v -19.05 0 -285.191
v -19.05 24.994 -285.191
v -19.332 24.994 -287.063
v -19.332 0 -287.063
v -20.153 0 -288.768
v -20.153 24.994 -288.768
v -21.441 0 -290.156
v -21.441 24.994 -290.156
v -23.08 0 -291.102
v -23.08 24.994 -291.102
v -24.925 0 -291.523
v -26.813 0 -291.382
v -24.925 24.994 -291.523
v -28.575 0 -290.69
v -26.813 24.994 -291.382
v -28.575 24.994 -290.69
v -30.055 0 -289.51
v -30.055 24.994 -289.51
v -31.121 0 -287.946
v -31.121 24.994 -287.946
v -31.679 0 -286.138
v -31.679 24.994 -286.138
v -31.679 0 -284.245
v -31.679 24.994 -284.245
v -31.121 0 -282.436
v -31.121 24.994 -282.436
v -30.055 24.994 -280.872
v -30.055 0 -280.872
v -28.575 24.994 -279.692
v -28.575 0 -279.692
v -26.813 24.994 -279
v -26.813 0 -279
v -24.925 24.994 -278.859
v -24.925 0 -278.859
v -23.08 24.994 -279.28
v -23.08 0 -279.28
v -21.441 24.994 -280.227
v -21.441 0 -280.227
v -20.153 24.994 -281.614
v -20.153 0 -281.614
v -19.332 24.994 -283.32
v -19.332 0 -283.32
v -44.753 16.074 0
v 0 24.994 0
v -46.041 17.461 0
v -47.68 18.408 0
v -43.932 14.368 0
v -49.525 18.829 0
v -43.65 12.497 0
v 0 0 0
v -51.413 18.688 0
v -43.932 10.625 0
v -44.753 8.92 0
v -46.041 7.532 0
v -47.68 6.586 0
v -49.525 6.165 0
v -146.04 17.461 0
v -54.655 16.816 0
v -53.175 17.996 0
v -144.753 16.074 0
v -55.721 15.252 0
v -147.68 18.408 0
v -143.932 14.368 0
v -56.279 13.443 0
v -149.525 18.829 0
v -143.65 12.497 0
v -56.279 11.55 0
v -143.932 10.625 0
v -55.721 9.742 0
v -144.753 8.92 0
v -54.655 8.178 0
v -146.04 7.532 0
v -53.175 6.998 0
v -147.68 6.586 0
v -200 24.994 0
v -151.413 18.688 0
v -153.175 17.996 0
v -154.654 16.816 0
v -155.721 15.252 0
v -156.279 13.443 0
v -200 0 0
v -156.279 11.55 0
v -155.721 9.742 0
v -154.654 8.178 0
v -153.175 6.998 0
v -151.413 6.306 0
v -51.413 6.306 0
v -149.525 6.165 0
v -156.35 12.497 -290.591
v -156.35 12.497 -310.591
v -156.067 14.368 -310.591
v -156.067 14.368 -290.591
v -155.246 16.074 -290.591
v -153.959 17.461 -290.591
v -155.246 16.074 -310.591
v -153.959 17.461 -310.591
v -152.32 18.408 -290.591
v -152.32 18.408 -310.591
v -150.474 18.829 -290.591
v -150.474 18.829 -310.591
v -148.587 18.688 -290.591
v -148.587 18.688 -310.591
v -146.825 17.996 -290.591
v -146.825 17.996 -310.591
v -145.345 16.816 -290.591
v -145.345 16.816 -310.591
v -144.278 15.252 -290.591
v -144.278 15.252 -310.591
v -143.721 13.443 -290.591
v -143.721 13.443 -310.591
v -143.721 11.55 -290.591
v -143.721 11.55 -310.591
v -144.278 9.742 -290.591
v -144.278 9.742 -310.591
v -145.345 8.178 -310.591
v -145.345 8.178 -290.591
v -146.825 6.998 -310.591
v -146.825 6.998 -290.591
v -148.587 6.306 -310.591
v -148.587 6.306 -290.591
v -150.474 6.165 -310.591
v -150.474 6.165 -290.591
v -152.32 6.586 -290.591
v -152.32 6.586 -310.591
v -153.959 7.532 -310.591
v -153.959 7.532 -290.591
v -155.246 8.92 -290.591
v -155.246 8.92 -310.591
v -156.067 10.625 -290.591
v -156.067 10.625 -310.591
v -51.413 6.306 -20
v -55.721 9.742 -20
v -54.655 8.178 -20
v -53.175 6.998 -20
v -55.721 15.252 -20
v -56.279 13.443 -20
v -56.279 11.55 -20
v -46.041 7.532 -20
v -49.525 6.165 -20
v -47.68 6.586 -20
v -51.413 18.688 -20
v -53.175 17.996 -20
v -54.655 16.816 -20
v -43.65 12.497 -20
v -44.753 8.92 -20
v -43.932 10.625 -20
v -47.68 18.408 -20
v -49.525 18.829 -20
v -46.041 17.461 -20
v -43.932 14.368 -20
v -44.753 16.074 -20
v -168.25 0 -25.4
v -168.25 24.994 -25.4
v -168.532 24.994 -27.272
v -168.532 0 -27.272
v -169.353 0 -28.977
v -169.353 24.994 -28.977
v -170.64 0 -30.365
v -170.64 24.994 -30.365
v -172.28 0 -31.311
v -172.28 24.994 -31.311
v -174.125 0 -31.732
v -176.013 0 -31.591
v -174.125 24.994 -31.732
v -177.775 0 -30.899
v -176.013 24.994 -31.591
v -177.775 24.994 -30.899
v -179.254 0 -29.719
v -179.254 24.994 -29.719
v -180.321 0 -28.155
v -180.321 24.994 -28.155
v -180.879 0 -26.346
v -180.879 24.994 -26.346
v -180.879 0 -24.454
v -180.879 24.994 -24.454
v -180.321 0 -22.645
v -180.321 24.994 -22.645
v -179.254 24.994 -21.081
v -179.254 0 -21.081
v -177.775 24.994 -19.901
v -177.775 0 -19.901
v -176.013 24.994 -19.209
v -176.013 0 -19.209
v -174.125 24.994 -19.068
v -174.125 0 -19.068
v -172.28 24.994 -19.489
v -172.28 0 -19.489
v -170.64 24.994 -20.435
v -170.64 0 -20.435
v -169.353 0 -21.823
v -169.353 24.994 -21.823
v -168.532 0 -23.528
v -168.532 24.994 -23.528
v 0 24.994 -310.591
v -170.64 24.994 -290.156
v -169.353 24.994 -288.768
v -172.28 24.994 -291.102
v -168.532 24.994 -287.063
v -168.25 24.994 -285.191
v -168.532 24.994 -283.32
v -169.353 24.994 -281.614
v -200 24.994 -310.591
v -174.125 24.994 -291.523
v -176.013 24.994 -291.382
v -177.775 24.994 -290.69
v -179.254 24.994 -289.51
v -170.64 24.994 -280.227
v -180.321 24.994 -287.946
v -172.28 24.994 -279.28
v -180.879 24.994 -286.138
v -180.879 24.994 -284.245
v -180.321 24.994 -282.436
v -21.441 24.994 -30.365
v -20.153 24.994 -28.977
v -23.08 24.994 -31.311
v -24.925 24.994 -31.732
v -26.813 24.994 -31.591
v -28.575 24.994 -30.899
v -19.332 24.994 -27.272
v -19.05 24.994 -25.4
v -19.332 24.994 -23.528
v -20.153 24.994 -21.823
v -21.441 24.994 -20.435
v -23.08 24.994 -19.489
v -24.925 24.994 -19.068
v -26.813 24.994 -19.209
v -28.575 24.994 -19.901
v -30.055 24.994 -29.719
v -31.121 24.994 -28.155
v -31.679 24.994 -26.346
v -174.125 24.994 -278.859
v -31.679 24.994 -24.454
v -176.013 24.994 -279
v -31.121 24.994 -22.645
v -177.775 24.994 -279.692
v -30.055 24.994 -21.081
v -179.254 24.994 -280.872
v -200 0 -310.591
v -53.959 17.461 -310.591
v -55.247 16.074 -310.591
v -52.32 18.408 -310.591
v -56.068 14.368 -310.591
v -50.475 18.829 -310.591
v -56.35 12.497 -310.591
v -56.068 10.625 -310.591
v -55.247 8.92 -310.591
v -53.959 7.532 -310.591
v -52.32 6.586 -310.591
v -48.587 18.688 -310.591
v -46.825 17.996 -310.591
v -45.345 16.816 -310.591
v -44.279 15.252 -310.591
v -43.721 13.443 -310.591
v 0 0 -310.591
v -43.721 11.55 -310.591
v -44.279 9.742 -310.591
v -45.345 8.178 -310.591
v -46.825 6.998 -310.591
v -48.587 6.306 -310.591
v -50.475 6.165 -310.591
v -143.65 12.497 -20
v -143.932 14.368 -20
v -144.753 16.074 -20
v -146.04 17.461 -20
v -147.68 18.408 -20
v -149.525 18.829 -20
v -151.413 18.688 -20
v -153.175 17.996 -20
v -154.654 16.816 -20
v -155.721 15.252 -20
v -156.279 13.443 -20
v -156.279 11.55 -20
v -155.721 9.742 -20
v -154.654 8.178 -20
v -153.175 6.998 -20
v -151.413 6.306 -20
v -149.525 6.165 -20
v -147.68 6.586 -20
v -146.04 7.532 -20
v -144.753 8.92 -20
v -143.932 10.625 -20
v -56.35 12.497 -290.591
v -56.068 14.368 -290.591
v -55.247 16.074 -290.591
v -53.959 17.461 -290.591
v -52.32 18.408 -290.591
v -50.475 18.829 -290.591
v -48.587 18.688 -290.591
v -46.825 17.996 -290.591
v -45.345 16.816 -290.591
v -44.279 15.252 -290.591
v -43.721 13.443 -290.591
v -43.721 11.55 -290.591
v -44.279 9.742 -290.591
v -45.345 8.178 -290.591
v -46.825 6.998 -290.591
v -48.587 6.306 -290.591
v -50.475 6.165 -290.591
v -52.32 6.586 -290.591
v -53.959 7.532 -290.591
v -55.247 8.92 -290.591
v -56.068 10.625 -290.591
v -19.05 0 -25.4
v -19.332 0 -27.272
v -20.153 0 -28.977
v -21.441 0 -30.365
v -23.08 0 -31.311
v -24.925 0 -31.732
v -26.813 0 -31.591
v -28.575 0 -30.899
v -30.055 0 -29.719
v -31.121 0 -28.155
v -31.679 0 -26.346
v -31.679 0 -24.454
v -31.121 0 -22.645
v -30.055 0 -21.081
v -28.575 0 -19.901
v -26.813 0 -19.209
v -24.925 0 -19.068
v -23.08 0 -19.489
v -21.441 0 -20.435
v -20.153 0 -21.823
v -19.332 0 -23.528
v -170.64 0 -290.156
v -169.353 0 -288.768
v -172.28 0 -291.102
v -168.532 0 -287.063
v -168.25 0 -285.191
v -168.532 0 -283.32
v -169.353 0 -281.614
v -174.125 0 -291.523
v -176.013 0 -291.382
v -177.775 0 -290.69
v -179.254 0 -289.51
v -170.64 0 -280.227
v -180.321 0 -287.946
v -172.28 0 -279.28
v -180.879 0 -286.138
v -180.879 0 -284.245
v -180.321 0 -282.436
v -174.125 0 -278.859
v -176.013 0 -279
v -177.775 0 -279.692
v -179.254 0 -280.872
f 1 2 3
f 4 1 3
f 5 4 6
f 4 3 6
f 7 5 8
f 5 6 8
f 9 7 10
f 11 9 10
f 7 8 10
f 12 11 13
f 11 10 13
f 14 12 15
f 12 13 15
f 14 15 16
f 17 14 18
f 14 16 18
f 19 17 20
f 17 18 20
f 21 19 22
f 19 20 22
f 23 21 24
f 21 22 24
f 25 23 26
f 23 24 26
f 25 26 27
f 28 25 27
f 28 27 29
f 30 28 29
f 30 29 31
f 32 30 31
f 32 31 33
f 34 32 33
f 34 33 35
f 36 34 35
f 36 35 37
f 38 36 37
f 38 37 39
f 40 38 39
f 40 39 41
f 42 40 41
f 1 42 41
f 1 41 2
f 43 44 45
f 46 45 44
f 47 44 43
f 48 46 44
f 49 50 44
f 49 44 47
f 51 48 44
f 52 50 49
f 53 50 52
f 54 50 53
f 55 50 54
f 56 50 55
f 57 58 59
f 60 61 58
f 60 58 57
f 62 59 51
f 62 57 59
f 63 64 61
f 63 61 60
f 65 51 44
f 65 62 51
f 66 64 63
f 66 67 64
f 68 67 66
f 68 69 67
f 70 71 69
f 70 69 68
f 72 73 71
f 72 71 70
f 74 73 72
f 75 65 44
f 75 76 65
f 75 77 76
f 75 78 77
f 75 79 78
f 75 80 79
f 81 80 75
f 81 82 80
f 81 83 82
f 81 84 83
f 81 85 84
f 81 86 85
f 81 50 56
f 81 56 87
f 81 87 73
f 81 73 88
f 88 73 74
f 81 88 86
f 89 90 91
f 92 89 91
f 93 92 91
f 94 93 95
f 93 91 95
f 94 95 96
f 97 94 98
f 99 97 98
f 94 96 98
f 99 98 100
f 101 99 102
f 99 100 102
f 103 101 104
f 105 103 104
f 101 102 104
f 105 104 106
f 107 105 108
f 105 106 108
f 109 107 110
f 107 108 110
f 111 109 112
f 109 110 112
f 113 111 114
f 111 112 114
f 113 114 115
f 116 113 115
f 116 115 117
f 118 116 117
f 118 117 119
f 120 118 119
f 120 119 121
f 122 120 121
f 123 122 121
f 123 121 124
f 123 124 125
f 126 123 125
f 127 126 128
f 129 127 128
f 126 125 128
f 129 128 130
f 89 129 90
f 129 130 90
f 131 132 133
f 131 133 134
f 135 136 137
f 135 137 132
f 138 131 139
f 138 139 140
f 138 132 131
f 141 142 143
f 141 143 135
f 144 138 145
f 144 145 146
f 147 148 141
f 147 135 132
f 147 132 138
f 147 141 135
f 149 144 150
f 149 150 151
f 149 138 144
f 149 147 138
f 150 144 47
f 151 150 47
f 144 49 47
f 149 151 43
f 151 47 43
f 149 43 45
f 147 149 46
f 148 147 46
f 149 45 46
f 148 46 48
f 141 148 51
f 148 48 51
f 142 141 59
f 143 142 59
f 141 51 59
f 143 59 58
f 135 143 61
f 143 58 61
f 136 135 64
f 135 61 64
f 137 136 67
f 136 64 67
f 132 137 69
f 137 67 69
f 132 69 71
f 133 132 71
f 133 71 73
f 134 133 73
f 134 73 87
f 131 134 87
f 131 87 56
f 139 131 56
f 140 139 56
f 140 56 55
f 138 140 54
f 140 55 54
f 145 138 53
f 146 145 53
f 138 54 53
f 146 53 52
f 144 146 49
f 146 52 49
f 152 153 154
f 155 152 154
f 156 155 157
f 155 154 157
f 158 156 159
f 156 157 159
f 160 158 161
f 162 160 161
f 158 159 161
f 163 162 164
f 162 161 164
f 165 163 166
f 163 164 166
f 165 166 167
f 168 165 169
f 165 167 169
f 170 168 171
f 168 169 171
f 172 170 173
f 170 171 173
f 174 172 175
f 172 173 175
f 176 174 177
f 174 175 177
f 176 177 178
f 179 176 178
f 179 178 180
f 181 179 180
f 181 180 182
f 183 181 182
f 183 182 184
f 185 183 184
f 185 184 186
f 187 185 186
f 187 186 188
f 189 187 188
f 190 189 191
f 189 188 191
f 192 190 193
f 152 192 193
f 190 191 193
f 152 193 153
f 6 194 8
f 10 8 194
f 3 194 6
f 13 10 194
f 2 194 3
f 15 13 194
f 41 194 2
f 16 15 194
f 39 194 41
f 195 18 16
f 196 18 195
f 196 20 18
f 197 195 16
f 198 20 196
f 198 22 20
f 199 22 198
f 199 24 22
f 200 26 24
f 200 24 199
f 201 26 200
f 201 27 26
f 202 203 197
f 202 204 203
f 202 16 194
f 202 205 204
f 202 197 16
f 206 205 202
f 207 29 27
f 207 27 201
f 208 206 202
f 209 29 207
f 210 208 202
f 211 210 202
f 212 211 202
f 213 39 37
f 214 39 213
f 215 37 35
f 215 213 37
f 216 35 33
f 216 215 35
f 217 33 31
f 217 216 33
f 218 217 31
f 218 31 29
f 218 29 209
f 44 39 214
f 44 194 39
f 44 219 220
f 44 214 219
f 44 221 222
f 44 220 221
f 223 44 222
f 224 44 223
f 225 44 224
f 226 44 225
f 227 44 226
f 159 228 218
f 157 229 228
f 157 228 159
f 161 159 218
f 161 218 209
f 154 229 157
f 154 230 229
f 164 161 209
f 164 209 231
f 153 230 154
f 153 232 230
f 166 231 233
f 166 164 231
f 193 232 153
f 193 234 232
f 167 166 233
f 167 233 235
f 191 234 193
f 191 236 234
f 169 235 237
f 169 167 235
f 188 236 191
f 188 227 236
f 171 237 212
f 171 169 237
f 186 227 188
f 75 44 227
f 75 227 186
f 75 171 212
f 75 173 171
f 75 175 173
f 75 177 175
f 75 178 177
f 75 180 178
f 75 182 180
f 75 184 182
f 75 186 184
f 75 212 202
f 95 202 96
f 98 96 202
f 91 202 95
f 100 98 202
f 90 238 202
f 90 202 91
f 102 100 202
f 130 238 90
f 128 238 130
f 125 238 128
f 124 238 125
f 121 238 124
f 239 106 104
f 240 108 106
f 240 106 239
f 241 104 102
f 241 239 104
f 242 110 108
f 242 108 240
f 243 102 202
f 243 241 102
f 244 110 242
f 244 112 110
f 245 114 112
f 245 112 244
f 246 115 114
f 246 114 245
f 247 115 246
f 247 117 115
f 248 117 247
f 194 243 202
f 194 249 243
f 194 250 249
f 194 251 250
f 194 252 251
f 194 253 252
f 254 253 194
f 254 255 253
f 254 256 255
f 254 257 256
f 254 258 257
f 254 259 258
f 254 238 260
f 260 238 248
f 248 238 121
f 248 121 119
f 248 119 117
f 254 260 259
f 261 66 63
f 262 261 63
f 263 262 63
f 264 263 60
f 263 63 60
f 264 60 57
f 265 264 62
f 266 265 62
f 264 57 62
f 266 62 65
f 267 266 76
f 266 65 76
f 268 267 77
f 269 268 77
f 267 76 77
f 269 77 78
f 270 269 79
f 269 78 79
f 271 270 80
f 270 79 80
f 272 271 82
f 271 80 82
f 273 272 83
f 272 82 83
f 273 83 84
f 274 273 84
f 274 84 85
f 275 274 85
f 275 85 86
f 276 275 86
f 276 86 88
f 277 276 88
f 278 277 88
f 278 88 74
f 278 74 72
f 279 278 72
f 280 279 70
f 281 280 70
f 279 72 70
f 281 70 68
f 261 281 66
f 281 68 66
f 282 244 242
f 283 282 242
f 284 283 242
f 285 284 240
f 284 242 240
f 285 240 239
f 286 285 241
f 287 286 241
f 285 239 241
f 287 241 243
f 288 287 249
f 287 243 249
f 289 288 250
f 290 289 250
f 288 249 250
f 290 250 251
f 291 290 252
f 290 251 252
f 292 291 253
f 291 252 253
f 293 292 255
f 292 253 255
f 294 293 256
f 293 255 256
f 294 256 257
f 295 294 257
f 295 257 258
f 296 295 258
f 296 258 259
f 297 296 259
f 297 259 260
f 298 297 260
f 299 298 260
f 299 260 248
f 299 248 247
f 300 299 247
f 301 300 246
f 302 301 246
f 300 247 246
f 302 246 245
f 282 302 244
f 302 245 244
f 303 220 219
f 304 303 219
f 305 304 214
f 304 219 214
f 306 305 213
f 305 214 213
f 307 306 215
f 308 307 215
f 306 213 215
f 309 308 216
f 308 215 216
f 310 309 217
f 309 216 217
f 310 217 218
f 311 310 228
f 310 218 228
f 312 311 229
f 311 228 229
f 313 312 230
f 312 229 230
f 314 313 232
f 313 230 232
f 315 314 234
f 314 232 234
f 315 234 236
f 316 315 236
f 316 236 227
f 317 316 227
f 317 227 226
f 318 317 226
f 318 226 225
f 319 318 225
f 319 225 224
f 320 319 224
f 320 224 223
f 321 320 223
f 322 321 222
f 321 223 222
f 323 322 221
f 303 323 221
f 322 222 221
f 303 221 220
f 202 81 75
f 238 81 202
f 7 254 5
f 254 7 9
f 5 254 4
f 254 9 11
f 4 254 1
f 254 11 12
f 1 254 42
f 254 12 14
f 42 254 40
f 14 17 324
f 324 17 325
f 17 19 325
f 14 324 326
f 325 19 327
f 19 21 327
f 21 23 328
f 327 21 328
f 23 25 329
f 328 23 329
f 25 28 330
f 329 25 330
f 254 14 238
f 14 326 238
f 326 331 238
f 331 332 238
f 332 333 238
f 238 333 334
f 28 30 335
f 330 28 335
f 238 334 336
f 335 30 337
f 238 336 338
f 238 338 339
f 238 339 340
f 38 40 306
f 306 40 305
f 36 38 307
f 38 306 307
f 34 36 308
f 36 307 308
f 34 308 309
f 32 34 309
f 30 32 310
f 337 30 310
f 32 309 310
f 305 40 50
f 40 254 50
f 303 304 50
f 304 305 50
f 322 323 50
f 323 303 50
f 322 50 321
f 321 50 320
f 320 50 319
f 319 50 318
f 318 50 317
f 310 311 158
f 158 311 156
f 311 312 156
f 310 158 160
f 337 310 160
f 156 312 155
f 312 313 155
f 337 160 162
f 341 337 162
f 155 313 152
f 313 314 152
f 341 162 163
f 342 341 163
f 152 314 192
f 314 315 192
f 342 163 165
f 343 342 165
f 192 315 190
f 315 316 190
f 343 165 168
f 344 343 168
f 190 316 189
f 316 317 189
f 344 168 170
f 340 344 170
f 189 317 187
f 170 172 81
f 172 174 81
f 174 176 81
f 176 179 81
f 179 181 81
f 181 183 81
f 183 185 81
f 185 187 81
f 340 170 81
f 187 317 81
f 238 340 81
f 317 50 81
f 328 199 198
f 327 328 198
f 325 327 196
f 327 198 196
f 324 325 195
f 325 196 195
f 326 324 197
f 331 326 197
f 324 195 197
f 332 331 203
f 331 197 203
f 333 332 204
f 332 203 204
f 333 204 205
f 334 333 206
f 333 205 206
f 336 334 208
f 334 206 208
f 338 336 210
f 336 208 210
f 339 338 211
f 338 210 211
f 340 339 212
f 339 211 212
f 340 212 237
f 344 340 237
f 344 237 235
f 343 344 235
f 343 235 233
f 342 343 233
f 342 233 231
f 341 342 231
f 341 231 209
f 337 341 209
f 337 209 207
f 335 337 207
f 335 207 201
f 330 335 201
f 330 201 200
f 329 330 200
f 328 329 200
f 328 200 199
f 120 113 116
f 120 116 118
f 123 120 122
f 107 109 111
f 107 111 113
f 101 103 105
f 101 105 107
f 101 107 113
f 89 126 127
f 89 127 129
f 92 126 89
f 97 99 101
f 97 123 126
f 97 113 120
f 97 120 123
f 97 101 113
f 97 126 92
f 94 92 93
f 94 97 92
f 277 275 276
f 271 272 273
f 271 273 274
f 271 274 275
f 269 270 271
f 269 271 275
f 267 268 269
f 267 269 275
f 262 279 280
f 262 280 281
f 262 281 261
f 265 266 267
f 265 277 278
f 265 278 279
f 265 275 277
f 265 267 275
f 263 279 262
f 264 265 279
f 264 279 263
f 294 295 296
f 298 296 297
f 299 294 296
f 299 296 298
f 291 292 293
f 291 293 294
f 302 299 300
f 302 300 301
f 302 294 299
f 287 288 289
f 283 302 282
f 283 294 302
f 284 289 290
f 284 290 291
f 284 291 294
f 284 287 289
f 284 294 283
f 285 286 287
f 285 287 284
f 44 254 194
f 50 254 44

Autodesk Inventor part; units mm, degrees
ref_plane "YZ Plane" through (0, 0, 0) normal (1, 0, 0) x (0, 1, 0)
ref_plane "XZ Plane" through (0, 0, 0) normal (0, 1, 0) x (-1, 0, 0)
ref_plane "XY Plane" through (0, 0, 0) normal (0, 0, 1) x (1, 0, 0)
sketch "Sketch1" plane through (0, 0, 0) normal (0, 1, 0) x (-1, 0, 0)
  line L0 (0, 0) -> (199.9996, 0)
  line L1 (199.9996, 0) -> (199.9996, -310.5912)
  line L2 (199.9996, -310.5912) -> (0, -310.5912)
  line L3 (0, -310.5912) -> (0, 0)
  dimension "d0" = 199.9996
  dimension "d1" = 310.5912
extrude "Extrusion1" add sketch "Sketch1" along normal blind 24.9936
sketch "Sketch2" plane through (0, 24.9936, 0) normal (0, 1, 0) x (1, 0, 0)
  circle A0 centre (-174.5996, 25.4) radius 6.35
  circle A1 centre (-174.5996, 285.1912) radius 6.35
  circle A2 centre (-25.4, 25.4) radius 6.35
  circle A3 centre (-25.4, 285.1912) radius 6.35
  line L0 (-199.9996, 310.5912) -> (-199.9996, 0) projected
  line L1 (-199.9996, 0) -> (0, 0) projected
  line L2 (0, 310.5912) -> (-199.9996, 310.5912) projected
  line L3 (0, 0) -> (0, 310.5912) projected
  dimension "d4" = 12.7
  dimension "d5" = 25.4
  dimension "d6" = 25.4
  dimension "d7" = 12.7
  dimension "d8" = 25.4
  dimension "d9" = 25.4
  dimension "d10" = 25.4
  dimension "d11" = 25.4
  dimension "d12" = 12.7
  dimension "d13" = 12.7
  dimension "d14" = 25.4
  dimension "d15" = 25.4
extrude "Extrusion2" cut sketch "Sketch2" against normal blind 24.9936 contours A0 | A1 | A2 | A3
sketch "Sketch3" plane through (-199.9996, 0, 0) normal (0, 0, 1) x (1, 0, 0)
  circle A0 centre (50, 12.4968) radius 6.35
  circle A1 centre (149.9996, 12.4968) radius 6.35
  line L0 (0, 0) -> (0, 24.9936) projected
  line L1 (0, 24.9936) -> (199.9996, 24.9936) projected
  line L2 (199.9996, 0) -> (199.9996, 24.9936) projected
  point P0 (199.9996, 12.4968)
  dimension "d18" = 12.7
  dimension "d19" = 50
  dimension "d20" = 12.4968
  dimension "d21" = 12.4968
  dimension "d22" = 50
  dimension "d23" = 12.7
sketch "Sketch4" plane through (0, 0, -310.5912) normal (0, 0, -1) x (-1, 0, 0)
  circle A0 centre (50, 12.4968) radius 6.35
  circle A1 centre (149.9996, 12.4968) radius 6.35
  line L0 (0, 0) -> (0, 24.9936) projected
  line L1 (0, 0) -> (199.9996, 0) projected
  line L2 (199.9996, 0) -> (199.9996, 24.9936) projected
  dimension "d24" = 12.7
  dimension "d25" = 12.7
  dimension "d26" = 50
  dimension "d27" = 12.4968
  dimension "d28" = 12.4968
  dimension "d29" = 50
extrude "Extrusion3" cut sketch "Sketch3" against normal blind 20
extrude "Extrusion4" cut sketch "Sketch4" against normal blind 20
equation "\"d7\" = d4"
equation "\"d8\" = d5"
equation "\"d9\" = d5"
equation "\"d10\" = d5"
equation "\"d11\" = d5"
equation "\"d12\" = d4"
equation "\"d13\" = d4"
equation "\"d14\" = d5"
equation "\"d15\" = d5"
equation "\"d21\" = d20"
equation "\"d22\" = d19"
equation "\"d23\" = d18"
equation "\"d24\" = d18"
equation "\"d25\" = d18"
equation "\"d26\" = d22"
equation "\"d27\" = d21"
equation "\"d28\" = d21"
equation "\"d29\" = d26"
properties part number "FloorMountV2"
